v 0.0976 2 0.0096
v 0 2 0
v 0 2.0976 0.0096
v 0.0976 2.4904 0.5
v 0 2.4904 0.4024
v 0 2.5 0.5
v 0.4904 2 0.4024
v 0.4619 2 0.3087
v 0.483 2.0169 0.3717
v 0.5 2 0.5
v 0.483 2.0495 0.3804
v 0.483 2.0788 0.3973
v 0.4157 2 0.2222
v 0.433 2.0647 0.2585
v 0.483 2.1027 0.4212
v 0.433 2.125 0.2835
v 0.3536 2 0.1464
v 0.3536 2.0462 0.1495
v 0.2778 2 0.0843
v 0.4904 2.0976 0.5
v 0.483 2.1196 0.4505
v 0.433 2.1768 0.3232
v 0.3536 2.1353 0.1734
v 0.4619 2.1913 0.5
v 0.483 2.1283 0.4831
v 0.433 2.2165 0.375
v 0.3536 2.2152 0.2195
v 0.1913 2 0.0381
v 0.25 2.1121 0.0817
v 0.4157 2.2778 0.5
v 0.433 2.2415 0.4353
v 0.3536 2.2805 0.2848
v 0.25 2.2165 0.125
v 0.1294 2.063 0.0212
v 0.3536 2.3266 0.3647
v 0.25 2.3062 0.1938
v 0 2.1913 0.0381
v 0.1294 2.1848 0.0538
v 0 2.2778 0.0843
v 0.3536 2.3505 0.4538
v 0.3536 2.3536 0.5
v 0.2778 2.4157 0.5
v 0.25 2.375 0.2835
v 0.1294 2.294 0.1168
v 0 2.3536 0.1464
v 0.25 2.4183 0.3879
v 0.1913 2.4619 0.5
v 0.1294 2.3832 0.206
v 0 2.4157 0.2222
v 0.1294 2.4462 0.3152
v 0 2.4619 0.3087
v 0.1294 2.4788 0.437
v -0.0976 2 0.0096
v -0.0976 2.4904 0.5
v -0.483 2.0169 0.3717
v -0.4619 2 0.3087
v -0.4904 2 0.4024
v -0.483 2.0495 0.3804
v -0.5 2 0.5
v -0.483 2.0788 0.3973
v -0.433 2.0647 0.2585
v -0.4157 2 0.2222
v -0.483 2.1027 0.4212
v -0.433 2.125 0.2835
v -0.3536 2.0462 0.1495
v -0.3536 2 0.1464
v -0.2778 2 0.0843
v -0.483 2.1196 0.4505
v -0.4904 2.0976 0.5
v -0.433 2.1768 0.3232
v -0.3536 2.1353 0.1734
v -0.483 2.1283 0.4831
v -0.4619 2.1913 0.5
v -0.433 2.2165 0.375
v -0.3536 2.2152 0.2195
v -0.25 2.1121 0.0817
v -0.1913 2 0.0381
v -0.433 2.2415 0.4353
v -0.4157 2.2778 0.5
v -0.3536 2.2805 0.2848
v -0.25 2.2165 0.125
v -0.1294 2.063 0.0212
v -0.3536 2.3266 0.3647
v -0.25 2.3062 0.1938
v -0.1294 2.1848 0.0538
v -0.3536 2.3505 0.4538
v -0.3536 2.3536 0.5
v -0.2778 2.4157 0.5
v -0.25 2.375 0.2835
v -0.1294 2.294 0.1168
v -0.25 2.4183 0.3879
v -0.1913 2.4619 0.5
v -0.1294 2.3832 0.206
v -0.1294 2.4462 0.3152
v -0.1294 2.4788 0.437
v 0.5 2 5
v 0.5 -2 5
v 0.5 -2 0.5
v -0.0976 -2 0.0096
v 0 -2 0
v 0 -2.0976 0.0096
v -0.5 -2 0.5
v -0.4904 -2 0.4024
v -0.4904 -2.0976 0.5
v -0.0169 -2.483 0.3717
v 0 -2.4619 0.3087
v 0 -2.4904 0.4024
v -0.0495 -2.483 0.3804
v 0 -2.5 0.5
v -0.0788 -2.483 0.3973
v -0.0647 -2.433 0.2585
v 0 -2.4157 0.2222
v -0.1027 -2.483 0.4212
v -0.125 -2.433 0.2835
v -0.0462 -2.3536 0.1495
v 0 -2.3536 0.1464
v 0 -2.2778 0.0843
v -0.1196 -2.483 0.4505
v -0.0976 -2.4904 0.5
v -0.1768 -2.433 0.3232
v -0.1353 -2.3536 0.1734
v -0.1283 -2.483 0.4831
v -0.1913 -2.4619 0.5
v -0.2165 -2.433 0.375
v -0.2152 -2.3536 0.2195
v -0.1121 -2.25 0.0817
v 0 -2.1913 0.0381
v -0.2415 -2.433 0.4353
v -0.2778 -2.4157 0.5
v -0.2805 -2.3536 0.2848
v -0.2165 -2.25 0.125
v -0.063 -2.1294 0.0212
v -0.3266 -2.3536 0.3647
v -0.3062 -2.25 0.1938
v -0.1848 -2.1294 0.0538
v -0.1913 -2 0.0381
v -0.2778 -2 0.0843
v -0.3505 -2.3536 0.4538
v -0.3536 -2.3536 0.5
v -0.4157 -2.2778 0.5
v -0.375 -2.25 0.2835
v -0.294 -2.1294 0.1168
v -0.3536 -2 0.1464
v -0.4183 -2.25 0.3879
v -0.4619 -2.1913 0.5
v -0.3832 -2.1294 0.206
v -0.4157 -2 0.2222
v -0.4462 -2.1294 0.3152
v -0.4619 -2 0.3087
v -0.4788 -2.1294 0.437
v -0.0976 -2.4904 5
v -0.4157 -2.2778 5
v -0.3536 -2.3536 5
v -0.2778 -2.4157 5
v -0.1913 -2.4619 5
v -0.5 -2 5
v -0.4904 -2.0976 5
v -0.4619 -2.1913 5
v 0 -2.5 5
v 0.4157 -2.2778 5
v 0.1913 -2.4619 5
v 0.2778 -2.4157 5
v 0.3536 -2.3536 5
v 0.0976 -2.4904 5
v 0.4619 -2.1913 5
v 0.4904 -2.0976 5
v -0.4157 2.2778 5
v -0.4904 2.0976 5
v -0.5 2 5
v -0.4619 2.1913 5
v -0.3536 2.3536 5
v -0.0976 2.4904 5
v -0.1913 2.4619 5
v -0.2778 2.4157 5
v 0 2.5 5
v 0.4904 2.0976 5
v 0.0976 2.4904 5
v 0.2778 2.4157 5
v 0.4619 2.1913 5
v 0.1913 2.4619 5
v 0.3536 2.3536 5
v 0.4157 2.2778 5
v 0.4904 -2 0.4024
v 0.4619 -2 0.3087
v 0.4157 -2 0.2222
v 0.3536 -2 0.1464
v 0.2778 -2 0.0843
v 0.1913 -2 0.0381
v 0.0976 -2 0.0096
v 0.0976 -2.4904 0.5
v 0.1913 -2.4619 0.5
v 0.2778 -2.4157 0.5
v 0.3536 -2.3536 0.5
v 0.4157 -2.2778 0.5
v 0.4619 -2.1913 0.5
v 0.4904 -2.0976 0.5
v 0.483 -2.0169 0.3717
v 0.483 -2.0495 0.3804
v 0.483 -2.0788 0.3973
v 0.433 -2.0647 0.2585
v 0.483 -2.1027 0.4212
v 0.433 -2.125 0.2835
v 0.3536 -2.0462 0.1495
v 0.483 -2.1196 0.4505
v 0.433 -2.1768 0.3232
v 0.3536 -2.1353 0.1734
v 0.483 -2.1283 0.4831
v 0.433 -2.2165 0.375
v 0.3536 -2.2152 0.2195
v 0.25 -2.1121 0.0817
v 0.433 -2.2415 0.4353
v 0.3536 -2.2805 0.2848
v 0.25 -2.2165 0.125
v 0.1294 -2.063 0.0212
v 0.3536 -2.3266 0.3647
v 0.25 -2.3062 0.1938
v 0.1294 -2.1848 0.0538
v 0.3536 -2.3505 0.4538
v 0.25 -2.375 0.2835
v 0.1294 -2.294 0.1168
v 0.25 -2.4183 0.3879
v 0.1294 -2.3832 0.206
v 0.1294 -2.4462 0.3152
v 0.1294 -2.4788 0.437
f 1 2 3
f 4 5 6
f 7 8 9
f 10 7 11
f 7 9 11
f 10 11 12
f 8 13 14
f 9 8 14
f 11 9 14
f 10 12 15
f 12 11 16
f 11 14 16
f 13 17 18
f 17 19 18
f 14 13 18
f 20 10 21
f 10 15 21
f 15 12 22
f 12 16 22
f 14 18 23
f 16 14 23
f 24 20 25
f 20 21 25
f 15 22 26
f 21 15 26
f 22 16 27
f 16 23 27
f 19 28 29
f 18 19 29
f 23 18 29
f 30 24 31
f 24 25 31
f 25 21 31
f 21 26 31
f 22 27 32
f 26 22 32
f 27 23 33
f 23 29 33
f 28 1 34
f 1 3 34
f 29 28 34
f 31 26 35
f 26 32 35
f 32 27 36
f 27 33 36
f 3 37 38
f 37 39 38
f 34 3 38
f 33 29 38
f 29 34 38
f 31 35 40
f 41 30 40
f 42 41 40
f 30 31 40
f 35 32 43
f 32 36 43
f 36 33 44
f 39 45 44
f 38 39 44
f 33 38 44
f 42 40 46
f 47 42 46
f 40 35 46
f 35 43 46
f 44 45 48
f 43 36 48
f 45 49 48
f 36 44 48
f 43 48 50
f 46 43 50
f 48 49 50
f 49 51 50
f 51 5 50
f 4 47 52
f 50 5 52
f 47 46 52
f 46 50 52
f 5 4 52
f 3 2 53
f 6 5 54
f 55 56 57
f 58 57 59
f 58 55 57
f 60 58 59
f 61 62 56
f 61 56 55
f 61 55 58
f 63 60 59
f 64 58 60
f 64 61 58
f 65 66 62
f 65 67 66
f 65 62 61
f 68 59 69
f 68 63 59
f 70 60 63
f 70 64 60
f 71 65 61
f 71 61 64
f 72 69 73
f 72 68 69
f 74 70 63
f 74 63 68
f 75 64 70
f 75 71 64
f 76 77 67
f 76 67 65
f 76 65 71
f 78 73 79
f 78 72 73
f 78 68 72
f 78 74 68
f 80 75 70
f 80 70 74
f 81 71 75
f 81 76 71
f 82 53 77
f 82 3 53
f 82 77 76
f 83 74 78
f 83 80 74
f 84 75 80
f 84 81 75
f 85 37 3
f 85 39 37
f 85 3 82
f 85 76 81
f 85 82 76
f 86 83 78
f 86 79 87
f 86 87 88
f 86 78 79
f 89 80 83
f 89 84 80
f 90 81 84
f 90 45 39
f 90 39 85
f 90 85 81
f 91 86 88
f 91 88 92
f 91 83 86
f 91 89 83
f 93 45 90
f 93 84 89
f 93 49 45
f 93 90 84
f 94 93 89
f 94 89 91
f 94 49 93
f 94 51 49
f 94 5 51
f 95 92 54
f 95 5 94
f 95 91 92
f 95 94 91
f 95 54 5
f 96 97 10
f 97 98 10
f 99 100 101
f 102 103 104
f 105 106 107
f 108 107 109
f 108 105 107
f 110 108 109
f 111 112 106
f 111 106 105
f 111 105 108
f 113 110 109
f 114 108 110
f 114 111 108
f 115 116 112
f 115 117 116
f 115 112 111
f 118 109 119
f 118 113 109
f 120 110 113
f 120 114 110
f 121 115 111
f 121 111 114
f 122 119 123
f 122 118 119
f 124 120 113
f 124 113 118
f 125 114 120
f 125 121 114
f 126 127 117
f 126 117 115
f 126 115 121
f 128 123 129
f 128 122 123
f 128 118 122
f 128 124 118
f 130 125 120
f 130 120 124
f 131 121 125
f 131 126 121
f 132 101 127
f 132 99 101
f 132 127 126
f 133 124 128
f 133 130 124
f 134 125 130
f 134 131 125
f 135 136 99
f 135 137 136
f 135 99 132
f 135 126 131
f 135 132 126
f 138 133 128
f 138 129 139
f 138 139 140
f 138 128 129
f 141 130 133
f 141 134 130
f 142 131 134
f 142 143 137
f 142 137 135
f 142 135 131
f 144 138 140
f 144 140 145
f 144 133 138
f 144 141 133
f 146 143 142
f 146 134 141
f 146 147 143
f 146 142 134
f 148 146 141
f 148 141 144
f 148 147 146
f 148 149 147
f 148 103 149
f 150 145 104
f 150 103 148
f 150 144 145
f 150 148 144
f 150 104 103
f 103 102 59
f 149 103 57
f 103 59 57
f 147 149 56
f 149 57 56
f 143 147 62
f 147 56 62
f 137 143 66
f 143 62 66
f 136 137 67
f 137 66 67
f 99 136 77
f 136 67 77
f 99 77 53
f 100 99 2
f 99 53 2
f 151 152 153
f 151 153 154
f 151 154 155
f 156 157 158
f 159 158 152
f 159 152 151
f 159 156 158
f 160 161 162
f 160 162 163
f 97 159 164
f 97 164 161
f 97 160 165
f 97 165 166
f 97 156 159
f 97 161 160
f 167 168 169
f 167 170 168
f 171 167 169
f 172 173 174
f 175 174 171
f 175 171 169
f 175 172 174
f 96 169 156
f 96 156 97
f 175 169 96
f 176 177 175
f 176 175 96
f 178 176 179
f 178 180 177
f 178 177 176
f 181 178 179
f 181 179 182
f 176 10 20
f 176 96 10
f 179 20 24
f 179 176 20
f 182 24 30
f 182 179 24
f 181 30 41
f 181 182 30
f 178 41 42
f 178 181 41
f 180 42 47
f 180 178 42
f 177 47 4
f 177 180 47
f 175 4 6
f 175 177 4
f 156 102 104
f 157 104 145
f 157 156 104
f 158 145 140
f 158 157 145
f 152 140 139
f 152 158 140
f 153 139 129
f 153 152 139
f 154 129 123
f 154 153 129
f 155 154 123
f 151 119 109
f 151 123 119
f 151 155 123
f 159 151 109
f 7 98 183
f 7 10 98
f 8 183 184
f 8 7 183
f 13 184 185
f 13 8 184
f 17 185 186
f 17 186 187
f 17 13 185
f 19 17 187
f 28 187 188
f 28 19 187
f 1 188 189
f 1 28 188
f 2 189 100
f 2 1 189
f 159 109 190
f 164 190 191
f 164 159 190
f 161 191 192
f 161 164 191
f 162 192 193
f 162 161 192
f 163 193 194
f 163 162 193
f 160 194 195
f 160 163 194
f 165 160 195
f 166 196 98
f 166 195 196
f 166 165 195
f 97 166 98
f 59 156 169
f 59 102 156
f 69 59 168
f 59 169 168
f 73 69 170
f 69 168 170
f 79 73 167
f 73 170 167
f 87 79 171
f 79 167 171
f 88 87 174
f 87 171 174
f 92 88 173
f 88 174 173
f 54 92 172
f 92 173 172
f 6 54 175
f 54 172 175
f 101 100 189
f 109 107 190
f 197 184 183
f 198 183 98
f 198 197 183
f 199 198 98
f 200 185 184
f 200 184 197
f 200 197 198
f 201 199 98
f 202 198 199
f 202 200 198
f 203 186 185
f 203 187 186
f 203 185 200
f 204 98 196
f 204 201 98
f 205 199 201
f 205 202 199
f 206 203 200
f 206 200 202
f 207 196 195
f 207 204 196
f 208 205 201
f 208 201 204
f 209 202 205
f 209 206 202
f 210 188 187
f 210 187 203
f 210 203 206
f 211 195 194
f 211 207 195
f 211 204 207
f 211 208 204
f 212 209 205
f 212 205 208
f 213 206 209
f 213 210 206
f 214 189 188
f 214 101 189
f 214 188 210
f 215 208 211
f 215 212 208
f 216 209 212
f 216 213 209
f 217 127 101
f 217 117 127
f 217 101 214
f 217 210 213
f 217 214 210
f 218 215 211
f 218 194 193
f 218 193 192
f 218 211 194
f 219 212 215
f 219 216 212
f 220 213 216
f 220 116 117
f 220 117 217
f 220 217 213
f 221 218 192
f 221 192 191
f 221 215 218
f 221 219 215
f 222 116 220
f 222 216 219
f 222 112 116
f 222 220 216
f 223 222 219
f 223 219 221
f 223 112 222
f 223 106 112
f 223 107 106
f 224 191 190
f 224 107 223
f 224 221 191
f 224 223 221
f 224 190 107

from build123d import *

# Parameters (mm, degrees)
F0_W     = 1
F0_H     = 5
F1_DEPTH = 5
F2_R     = 0.49999


# Not quite as in the source:
# - a fillet or chamfer is up to 0.001 mm smaller than in the source, because OpenCascade refuses the exact size


with BuildPart() as f1:
    # F0 (on Top) → F1 (new body)
    with BuildSketch(Plane.XY):
        Rectangle(F0_W, F0_H)
    extrude(amount=F1_DEPTH)

    # F2 (radius 0.5 in the source; OpenCascade refuses exactly that, so slightly less here)
    f2_edges = [f1.edges().sort_by_distance(p)[0] for p in [
        (0, 2.5, 0),
        (-0.5, 0, 0),
        (0, -2.5, 0),
        (0.5, 0, 0),
        (0.5, 2.5, 2.5),
        (-0.5, 2.5, 2.5),
        (-0.5, -2.5, 2.5),
        (0.5, -2.5, 2.5),
    ]]
    fillet(f2_edges, radius=F2_R)


solid = f1.part
